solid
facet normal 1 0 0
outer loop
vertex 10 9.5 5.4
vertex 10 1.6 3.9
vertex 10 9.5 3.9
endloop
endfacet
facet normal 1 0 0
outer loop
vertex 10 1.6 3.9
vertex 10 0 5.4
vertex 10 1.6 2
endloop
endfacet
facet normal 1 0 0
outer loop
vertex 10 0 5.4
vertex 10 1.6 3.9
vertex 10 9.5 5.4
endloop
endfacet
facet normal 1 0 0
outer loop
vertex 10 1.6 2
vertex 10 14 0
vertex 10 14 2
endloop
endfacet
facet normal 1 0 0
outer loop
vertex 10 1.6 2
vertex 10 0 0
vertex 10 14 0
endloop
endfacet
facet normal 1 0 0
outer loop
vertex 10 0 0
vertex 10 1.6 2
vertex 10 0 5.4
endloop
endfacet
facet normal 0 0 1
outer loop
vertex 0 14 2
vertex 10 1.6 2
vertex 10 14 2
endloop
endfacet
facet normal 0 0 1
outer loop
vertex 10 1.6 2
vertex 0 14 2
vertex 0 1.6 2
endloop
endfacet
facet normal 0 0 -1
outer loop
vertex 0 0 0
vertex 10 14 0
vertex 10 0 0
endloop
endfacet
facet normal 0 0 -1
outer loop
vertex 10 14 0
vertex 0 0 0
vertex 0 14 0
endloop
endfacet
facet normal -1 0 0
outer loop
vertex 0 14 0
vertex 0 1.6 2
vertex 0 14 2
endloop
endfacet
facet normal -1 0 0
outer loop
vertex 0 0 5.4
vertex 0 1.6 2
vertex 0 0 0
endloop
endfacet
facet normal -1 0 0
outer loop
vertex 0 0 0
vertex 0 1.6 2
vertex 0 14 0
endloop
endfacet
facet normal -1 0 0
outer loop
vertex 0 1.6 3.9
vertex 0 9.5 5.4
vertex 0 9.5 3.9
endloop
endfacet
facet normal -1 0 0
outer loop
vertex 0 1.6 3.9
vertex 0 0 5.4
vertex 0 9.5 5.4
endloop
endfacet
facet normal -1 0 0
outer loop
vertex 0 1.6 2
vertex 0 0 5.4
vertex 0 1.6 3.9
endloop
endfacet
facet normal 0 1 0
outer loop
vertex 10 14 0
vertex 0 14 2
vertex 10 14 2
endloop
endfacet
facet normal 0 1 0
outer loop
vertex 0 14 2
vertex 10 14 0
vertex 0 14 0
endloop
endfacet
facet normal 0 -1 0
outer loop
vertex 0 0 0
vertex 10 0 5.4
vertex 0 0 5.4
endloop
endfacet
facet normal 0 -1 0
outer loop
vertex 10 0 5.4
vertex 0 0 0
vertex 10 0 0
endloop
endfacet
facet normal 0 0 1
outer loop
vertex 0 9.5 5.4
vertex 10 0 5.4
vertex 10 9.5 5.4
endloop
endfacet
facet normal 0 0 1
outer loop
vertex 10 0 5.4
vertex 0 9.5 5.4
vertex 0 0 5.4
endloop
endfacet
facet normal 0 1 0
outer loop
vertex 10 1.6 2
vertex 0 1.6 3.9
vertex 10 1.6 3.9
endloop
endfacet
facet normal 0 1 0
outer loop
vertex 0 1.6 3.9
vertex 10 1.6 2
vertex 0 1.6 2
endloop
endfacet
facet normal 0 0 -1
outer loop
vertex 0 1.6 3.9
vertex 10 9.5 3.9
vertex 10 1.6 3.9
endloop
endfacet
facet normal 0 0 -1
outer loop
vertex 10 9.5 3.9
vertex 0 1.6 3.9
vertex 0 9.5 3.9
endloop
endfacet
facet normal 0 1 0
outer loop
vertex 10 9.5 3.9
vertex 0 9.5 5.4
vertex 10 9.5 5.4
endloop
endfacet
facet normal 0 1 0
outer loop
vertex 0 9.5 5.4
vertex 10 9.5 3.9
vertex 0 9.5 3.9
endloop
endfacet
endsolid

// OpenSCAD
module doorStop() {
    union() {
        cube([10, 14, 2]);
        cube([10, 1.6, 5.4]);
        translate([0, 0, 5.4 - 1.5]) cube([10, 9.5, 1.5]);
    }
}

doorStop();
